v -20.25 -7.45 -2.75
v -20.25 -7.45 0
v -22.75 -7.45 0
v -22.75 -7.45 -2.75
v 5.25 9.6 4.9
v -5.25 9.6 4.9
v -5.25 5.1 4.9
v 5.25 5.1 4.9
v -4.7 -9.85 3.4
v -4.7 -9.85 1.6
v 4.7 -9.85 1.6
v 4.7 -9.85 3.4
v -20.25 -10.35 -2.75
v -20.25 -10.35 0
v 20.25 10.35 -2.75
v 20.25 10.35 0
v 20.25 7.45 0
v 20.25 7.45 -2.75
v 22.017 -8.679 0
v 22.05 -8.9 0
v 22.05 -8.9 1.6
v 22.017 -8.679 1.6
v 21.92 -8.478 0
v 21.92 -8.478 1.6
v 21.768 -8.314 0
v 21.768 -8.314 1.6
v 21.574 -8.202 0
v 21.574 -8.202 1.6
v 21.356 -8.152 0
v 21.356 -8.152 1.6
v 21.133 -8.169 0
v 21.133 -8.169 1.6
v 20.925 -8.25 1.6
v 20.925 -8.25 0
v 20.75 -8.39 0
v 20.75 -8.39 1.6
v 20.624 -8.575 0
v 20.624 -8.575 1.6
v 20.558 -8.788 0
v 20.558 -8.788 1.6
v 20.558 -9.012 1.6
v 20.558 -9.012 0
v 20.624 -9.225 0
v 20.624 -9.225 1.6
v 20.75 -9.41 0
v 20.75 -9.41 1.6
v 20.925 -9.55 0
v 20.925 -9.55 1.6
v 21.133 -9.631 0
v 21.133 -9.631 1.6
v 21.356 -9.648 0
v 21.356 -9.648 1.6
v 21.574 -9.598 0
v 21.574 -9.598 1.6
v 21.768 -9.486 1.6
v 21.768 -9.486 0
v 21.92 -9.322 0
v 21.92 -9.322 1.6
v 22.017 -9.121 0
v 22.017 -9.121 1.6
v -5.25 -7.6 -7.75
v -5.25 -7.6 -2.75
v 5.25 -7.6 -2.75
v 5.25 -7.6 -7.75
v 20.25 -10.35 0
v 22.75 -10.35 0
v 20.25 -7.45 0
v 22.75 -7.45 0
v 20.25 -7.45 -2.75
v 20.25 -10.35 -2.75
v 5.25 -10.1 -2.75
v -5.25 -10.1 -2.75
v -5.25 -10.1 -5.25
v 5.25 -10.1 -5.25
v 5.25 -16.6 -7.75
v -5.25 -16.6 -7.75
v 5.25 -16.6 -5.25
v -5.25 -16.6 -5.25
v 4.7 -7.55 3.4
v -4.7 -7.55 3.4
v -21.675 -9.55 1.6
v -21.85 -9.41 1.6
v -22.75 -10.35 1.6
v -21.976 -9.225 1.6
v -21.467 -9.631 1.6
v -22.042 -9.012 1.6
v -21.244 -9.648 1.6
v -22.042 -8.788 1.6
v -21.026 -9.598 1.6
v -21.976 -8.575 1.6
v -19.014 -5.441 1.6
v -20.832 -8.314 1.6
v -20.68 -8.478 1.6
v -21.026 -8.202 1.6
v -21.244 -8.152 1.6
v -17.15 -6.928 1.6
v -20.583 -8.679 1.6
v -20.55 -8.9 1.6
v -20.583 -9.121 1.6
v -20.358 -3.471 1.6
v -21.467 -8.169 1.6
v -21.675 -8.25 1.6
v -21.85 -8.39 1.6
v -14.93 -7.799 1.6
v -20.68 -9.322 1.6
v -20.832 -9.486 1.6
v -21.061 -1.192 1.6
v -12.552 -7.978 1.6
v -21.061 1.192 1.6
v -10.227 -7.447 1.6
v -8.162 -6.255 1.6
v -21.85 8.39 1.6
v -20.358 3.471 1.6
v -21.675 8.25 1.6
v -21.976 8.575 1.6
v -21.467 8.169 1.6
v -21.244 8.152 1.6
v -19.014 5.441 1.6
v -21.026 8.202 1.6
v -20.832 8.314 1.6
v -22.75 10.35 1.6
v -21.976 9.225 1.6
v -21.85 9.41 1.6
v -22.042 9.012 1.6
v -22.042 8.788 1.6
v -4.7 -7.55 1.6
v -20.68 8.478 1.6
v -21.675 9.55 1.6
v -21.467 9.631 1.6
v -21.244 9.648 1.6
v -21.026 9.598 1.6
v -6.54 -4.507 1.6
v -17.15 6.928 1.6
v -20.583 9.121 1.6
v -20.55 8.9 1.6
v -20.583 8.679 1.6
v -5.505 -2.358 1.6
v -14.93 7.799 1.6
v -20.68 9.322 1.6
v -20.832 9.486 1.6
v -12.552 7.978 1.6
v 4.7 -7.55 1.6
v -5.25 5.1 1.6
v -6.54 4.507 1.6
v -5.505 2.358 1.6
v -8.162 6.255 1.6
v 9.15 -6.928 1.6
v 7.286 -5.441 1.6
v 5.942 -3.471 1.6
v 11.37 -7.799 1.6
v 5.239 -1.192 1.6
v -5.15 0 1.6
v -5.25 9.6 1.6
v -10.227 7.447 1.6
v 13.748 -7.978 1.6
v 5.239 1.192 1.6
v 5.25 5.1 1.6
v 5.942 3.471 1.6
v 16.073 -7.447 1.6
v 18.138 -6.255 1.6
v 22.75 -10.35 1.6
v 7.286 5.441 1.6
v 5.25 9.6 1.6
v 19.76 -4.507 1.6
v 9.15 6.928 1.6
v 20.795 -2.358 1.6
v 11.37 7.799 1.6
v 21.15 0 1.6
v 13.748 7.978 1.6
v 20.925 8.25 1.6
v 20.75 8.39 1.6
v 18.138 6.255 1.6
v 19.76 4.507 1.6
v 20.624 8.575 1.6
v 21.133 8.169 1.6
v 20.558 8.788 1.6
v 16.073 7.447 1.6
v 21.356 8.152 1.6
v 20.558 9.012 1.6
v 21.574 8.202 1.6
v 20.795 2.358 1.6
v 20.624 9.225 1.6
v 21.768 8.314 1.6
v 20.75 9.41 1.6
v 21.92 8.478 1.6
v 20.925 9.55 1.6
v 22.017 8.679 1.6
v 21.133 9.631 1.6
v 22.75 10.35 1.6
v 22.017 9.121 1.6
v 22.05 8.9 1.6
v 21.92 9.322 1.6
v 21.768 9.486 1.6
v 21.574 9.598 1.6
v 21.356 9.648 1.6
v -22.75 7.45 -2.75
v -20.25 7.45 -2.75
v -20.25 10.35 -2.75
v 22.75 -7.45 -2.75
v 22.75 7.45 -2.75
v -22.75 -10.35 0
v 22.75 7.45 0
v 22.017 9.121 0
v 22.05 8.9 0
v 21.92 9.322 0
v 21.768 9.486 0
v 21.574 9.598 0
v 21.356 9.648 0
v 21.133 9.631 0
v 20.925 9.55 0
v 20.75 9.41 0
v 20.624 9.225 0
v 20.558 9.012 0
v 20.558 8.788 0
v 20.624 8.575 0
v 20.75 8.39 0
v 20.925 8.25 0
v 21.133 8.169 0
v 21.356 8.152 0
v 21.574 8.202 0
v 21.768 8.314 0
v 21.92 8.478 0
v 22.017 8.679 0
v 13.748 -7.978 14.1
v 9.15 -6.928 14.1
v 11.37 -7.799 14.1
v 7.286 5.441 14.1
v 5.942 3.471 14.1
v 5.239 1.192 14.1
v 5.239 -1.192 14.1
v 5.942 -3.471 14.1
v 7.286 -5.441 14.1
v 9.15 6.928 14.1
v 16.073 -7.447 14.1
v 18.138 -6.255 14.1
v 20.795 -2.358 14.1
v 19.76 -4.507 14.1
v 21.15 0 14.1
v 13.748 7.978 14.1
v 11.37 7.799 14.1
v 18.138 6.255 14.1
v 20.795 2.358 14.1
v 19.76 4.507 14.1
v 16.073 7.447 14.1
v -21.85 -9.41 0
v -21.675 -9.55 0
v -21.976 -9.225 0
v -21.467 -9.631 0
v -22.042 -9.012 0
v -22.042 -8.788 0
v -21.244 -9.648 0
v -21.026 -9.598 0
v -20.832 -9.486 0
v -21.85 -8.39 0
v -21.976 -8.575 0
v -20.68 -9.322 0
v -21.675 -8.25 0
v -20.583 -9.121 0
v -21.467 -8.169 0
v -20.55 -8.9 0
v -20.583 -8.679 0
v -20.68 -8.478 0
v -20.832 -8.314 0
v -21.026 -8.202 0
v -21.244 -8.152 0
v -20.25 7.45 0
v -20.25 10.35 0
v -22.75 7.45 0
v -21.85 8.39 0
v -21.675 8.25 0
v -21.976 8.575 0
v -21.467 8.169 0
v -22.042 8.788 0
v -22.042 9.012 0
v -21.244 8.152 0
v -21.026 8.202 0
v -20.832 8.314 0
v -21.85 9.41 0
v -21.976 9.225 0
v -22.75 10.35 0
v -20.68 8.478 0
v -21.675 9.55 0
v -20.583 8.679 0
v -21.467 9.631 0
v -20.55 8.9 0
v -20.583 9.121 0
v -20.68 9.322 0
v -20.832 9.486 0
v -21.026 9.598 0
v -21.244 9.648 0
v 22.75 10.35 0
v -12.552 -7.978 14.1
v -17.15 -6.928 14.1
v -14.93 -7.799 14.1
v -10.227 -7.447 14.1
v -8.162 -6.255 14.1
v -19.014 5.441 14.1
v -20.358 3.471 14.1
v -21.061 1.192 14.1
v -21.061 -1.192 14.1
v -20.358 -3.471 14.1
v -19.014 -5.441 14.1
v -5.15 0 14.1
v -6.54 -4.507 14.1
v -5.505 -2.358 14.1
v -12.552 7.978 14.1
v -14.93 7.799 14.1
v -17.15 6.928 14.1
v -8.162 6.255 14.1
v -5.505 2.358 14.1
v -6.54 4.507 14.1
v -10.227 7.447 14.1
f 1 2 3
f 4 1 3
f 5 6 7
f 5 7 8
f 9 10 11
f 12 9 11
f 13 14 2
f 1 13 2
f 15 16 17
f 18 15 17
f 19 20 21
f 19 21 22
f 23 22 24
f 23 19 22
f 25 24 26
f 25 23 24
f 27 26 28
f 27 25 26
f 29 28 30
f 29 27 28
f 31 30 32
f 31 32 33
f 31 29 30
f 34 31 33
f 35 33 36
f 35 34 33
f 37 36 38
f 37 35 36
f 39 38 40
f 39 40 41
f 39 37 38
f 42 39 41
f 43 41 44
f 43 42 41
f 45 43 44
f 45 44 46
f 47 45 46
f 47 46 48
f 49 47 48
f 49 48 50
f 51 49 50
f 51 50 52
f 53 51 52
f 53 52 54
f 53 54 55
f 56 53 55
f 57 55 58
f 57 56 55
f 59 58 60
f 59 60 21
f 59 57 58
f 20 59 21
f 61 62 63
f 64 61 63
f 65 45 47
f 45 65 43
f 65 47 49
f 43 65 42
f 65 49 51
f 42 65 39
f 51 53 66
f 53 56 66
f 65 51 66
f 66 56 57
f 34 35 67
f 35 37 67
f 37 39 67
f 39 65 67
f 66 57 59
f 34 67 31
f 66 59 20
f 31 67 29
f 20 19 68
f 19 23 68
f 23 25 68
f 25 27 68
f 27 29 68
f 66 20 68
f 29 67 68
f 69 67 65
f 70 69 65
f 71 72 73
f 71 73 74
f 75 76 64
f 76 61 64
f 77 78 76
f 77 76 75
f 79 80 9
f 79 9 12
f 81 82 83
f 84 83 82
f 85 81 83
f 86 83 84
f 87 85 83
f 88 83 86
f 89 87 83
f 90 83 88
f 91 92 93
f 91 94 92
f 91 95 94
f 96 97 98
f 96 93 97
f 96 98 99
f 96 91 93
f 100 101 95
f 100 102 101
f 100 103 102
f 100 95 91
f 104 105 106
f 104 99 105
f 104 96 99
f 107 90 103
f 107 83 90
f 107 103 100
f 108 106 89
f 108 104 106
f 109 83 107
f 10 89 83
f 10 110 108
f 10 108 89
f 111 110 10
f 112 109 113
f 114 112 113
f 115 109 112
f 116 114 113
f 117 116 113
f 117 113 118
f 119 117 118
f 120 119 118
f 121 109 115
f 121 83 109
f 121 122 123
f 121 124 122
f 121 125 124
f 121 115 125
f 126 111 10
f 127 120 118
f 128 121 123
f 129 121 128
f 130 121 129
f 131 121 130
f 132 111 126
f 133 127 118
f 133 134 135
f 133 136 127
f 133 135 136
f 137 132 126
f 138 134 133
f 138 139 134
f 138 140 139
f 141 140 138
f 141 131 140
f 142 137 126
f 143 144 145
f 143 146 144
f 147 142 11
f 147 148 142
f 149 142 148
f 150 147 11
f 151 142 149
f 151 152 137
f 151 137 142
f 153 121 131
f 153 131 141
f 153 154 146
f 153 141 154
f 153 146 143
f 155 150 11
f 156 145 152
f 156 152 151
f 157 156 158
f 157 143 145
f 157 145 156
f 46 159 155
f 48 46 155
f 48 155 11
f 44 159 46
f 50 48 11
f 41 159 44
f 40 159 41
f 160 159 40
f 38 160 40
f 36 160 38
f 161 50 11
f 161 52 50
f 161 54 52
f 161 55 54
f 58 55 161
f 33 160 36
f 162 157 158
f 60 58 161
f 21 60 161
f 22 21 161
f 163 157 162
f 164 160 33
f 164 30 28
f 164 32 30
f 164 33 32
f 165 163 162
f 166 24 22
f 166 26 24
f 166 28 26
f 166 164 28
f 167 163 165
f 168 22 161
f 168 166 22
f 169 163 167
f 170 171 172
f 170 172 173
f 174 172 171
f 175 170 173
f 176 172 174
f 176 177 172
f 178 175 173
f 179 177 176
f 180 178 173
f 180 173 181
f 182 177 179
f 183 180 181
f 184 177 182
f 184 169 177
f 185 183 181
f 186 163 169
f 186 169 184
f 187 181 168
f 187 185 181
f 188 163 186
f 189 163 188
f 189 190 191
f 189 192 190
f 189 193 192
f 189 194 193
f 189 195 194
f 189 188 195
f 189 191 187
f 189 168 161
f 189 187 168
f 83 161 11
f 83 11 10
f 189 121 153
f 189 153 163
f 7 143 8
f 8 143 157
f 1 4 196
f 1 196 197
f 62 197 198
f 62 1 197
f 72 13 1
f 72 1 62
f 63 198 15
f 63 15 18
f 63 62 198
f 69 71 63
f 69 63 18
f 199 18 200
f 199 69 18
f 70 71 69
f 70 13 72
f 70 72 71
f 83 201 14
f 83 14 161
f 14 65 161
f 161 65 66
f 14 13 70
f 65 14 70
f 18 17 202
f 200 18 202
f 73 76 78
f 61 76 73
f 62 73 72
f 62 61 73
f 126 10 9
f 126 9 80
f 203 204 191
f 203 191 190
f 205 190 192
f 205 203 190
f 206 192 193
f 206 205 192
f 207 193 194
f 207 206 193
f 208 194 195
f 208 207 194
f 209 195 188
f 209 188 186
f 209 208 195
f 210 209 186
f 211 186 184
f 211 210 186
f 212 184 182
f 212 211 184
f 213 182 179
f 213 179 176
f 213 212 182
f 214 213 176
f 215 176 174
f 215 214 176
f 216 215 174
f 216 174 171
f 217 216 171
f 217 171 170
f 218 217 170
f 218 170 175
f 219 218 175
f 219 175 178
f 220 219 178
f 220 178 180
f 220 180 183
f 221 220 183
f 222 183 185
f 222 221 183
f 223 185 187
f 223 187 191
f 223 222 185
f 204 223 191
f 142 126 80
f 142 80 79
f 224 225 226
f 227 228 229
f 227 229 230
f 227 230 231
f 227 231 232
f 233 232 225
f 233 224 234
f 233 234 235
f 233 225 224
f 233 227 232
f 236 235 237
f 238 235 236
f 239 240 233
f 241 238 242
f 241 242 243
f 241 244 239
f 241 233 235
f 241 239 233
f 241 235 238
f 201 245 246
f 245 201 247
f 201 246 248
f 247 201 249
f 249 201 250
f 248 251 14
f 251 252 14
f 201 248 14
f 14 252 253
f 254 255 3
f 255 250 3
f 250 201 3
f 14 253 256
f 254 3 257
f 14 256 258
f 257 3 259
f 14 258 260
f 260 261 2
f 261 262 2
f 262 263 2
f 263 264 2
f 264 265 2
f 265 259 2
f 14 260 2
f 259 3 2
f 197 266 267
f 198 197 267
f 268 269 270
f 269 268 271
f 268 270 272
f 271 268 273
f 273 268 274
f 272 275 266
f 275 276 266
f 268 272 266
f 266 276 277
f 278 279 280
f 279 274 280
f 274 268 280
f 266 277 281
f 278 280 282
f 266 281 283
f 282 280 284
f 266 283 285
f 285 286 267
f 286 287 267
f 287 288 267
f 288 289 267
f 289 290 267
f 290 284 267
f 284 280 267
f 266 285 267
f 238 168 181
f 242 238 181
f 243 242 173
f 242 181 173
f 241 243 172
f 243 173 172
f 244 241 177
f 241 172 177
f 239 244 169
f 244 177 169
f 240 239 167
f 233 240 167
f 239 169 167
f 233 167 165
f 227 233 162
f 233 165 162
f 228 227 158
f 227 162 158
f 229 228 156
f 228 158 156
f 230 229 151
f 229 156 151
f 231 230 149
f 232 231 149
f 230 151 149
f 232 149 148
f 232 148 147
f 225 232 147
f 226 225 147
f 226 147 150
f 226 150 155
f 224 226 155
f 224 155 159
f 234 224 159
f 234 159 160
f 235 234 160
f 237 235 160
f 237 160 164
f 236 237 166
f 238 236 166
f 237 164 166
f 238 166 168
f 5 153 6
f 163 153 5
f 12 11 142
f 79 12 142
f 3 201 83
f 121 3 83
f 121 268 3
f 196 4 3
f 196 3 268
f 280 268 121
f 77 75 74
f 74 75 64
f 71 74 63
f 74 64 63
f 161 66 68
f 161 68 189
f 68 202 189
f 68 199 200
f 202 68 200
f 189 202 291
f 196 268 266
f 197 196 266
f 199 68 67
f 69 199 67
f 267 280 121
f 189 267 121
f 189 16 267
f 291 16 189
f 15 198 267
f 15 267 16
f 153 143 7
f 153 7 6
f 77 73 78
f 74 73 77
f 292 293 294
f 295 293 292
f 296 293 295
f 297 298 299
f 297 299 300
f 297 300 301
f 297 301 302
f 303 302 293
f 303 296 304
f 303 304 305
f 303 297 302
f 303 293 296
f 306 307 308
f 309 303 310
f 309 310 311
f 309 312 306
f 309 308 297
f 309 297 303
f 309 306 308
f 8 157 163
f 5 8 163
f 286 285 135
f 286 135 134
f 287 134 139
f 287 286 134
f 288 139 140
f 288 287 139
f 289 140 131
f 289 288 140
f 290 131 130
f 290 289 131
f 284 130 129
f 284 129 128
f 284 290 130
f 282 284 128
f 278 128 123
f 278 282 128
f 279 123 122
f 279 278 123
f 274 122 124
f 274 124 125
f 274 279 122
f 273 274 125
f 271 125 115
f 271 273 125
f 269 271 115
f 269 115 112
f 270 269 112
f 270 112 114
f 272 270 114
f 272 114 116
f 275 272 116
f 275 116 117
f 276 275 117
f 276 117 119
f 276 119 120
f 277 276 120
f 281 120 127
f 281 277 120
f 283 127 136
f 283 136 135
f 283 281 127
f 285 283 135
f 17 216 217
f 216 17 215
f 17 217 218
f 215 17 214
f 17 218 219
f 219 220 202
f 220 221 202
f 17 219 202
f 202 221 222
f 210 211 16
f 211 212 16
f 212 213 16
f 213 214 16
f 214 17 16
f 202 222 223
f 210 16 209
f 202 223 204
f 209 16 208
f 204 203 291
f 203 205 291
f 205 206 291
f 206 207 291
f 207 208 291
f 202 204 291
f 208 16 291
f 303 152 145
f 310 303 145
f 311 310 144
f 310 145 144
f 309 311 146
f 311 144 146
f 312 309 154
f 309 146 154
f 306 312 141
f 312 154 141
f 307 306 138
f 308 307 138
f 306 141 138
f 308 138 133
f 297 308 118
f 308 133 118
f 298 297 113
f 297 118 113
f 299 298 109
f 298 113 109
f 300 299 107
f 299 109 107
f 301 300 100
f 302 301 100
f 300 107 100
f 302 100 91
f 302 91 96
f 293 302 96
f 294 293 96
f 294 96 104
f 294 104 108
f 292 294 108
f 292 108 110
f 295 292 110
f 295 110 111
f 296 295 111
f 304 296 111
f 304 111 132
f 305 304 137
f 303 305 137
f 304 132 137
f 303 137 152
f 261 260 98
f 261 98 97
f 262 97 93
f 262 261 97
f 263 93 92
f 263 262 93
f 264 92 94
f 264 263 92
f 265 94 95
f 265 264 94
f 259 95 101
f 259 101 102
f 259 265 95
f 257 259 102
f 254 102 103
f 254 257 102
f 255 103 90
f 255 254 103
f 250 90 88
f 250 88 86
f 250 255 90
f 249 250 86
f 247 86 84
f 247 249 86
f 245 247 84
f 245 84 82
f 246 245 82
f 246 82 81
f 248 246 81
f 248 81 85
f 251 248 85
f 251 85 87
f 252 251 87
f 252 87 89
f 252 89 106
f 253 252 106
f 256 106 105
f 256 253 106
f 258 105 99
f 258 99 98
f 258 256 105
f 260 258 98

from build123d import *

# Parameters (mm, degrees)
F0_W      = 45.5
F0_H      = 20.7
F0_R      = 0.75
F1_DEPTH  = 1.6
F2_R      = 8
F3_DEPTH  = 12.5
F2_W      = 10.5
F2_H      = 4.5
F4_DEPTH  = 3.3
F2_W_2    = 9.4
F2_H_2    = 2.3
F5_DEPTH  = 1.8
F7_DEPTH  = 2.75
F8_W      = 10.5
F8_H      = 2.5
F9_DEPTH  = 5
F10_W     = 10.5
F10_H     = 2.5
F11_DEPTH = 6.5


with BuildPart() as f1:
    # F0 (on Top) → F1 (new body)
    with BuildSketch(Plane.XY):
        Rectangle(F0_W, F0_H)
        with Locations((-21.3, -8.9)):
            Circle(F0_R, mode=Mode.SUBTRACT)
        with Locations((21.3, -8.9)):
            Circle(F0_R, mode=Mode.SUBTRACT)
        with Locations((-21.3, 8.9)):
            Circle(F0_R, mode=Mode.SUBTRACT)
        with Locations((21.3, 8.9)):
            Circle(F0_R, mode=Mode.SUBTRACT)
    extrude(amount=F1_DEPTH)

    # F2 (on face) → F3 (join)
    with BuildSketch(Plane.XY.offset(1.6)):
        with Locations((-13.15, 0)):
            Circle(F2_R)
        with Locations((13.15, 0)):
            Circle(F2_R)
    extrude(amount=F3_DEPTH)

    # F2 (on face) → F4 (join)
    with BuildSketch(Plane.XY.offset(1.6)):
        with Locations((0, 7.35)):
            Rectangle(F2_W, F2_H)
    extrude(amount=F4_DEPTH)

    # F2 (on face) → F5 (join)
    with BuildSketch(Plane.XY.offset(1.6)):
        with Locations((0, -8.7)):
            Rectangle(F2_W_2, F2_H_2)
    extrude(amount=F5_DEPTH)

    # F6 (on face) → F7 (join)
    with BuildSketch(Plane(origin=(0, 0, 0), x_dir=(1, 0, 0), z_dir=(0, 0, -1))):
        Polygon((-20.25, -7.45), (-20.25, -10.35), (20.25, -10.35), (20.25, -7.45), (22.75, -7.45), (22.75, 7.45), (20.25, 7.45), (20.25, 10.35), (-20.25, 10.35), (-20.25, 7.45), (-22.75, 7.45), (-22.75, -7.45), align=None)
    extrude(amount=F7_DEPTH)

    # F8 (on face) → F9 (join)
    with BuildSketch(Plane(origin=(0, 0, -2.75), x_dir=(1, 0, 0), z_dir=(0, 0, -1))):
        with Locations((0, 8.85)):
            Rectangle(F8_W, F8_H)
    extrude(amount=F9_DEPTH)

    # F10 (on face) → F11 (join)
    with BuildSketch(Plane.XZ.offset(10.1)):
        with Locations((0, -6.5)):
            Rectangle(F10_W, F10_H)
    extrude(amount=F11_DEPTH)


solid = f1.part
